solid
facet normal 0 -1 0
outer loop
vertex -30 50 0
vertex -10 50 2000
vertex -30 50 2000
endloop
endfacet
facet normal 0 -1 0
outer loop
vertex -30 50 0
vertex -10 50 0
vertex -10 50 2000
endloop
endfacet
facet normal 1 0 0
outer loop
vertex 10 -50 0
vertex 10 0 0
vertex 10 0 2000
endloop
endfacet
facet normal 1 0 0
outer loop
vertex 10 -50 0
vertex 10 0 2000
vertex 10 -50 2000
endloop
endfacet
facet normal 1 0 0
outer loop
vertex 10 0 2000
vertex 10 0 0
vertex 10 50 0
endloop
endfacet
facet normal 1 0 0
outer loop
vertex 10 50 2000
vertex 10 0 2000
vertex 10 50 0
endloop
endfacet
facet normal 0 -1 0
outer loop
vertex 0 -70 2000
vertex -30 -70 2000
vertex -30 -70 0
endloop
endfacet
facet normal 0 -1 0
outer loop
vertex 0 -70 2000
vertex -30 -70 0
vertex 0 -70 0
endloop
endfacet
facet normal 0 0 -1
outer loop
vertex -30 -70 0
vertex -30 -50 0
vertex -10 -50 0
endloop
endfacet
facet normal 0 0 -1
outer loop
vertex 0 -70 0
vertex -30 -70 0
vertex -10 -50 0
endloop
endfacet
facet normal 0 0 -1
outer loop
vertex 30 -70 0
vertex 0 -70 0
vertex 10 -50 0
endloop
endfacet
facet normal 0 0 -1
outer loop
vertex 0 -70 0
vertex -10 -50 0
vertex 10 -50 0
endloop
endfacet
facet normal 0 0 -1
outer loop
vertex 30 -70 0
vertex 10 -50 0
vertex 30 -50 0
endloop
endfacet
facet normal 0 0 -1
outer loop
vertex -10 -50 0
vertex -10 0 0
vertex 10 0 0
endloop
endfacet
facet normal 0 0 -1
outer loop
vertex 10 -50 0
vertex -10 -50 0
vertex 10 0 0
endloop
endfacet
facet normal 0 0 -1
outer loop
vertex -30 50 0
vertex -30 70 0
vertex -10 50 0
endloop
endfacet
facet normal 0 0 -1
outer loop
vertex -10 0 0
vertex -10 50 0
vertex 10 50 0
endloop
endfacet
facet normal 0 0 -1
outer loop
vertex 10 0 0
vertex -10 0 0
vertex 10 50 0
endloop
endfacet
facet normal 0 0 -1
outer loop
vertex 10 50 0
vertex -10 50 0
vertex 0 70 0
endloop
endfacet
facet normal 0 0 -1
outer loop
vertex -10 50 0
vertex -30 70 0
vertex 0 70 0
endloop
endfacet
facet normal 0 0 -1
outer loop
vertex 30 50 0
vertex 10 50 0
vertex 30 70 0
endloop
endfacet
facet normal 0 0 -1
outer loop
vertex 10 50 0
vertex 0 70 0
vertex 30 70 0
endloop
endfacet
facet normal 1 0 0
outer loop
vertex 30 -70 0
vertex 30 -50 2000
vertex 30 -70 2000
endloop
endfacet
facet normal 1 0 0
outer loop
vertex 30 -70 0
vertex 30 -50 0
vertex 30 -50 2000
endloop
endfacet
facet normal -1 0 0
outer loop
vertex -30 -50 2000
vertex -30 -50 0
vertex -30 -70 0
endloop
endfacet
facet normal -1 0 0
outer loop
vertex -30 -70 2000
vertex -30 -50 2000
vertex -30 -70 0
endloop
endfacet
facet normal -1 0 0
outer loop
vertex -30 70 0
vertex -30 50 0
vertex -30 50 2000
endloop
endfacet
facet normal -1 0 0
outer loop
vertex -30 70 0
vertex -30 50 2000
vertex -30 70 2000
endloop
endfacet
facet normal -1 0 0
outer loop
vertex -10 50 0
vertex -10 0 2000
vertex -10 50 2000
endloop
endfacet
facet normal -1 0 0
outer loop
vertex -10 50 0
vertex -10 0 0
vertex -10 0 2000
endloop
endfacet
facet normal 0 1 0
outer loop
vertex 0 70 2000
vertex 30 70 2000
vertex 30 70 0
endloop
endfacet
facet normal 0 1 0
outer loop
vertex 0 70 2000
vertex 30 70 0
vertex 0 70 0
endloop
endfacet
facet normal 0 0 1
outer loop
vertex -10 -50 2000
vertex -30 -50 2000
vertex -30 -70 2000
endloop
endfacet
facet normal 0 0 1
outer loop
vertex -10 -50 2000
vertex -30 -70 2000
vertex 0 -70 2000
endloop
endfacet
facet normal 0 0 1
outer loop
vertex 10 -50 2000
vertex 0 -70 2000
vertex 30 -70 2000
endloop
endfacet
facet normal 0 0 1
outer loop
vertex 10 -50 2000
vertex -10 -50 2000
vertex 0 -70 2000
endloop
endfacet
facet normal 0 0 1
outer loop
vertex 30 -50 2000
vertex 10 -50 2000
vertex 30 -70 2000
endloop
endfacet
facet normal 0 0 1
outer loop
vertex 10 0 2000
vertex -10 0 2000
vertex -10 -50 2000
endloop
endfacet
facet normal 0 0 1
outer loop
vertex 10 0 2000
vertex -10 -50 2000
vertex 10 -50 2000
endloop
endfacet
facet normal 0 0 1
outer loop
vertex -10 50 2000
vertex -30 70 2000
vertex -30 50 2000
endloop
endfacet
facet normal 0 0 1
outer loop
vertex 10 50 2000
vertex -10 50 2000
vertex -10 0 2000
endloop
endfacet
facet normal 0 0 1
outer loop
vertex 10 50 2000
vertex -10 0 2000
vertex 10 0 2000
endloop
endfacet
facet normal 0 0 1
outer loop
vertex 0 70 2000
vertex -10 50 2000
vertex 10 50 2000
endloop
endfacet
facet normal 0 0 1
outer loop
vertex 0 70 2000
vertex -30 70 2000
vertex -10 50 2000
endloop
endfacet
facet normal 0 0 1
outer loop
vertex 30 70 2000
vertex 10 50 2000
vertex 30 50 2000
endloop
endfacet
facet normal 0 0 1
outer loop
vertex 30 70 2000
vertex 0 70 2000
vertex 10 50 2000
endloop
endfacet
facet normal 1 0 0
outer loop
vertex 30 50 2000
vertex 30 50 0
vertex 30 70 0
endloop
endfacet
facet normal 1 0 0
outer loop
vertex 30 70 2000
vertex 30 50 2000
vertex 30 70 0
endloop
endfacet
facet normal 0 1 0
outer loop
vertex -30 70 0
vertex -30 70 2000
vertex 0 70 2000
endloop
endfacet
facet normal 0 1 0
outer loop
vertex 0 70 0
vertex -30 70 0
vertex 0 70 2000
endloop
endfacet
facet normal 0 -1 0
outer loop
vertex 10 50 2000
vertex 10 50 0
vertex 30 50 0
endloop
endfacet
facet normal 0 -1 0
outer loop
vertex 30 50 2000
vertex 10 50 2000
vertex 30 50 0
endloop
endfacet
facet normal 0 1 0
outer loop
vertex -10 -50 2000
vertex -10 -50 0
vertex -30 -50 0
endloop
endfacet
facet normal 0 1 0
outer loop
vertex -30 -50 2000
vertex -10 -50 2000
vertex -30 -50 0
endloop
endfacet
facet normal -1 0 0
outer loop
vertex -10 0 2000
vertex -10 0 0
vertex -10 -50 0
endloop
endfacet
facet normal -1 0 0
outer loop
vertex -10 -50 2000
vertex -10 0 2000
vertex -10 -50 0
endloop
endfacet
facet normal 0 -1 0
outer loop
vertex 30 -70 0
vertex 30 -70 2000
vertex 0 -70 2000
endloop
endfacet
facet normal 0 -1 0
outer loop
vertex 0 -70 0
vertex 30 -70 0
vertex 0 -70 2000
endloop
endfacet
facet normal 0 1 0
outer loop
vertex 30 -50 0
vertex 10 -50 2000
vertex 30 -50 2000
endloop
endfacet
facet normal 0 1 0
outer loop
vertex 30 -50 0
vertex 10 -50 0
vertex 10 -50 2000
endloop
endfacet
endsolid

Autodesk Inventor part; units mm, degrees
ref_plane "YZ Plane" through (0, 0, 0) normal (1, 0, 0) x (0, 1, 0)
ref_plane "XZ Plane" through (0, 0, 0) normal (0, 1, 0) x (-1, 0, 0)
ref_plane "XY Plane" through (0, 0, 0) normal (0, 0, 1) x (1, 0, 0)
sketch "Sketch1" plane through (0, 0, 0) normal (0, 0, 1) x (1, 0, 0)
  line L0 (10, 0) -> (10, 50)
  line L1 (10, 50) -> (30, 50)
  line L2 (30, 50) -> (30, 70)
  line L3 (30, 70) -> (0, 70)
  line L4 (10, 0) -> (10, -50)
  line L5 (10, -50) -> (30, -50)
  line L6 (30, -50) -> (30, -70)
  line L7 (30, -70) -> (0, -70)
  line L8 (-10, 0) -> (-10, 50)
  line L9 (-10, 50) -> (-30, 50)
  line L10 (-30, 50) -> (-30, 70)
  line L11 (-30, 70) -> (0, 70)
  line L12 (-10, 0) -> (-10, -50)
  line L13 (-10, -50) -> (-30, -50)
  line L14 (-30, -50) -> (-30, -70)
  line L15 (-30, -70) -> (0, -70)
  point P0 (0, 0)
  dimension "d4" = 50
  dimension "d5" = 20
  dimension "d6" = 20
extrude "Extrusion1" add sketch "Sketch1" along normal blind 2000
properties part number "A Console beam" material "Steel, Cast"
